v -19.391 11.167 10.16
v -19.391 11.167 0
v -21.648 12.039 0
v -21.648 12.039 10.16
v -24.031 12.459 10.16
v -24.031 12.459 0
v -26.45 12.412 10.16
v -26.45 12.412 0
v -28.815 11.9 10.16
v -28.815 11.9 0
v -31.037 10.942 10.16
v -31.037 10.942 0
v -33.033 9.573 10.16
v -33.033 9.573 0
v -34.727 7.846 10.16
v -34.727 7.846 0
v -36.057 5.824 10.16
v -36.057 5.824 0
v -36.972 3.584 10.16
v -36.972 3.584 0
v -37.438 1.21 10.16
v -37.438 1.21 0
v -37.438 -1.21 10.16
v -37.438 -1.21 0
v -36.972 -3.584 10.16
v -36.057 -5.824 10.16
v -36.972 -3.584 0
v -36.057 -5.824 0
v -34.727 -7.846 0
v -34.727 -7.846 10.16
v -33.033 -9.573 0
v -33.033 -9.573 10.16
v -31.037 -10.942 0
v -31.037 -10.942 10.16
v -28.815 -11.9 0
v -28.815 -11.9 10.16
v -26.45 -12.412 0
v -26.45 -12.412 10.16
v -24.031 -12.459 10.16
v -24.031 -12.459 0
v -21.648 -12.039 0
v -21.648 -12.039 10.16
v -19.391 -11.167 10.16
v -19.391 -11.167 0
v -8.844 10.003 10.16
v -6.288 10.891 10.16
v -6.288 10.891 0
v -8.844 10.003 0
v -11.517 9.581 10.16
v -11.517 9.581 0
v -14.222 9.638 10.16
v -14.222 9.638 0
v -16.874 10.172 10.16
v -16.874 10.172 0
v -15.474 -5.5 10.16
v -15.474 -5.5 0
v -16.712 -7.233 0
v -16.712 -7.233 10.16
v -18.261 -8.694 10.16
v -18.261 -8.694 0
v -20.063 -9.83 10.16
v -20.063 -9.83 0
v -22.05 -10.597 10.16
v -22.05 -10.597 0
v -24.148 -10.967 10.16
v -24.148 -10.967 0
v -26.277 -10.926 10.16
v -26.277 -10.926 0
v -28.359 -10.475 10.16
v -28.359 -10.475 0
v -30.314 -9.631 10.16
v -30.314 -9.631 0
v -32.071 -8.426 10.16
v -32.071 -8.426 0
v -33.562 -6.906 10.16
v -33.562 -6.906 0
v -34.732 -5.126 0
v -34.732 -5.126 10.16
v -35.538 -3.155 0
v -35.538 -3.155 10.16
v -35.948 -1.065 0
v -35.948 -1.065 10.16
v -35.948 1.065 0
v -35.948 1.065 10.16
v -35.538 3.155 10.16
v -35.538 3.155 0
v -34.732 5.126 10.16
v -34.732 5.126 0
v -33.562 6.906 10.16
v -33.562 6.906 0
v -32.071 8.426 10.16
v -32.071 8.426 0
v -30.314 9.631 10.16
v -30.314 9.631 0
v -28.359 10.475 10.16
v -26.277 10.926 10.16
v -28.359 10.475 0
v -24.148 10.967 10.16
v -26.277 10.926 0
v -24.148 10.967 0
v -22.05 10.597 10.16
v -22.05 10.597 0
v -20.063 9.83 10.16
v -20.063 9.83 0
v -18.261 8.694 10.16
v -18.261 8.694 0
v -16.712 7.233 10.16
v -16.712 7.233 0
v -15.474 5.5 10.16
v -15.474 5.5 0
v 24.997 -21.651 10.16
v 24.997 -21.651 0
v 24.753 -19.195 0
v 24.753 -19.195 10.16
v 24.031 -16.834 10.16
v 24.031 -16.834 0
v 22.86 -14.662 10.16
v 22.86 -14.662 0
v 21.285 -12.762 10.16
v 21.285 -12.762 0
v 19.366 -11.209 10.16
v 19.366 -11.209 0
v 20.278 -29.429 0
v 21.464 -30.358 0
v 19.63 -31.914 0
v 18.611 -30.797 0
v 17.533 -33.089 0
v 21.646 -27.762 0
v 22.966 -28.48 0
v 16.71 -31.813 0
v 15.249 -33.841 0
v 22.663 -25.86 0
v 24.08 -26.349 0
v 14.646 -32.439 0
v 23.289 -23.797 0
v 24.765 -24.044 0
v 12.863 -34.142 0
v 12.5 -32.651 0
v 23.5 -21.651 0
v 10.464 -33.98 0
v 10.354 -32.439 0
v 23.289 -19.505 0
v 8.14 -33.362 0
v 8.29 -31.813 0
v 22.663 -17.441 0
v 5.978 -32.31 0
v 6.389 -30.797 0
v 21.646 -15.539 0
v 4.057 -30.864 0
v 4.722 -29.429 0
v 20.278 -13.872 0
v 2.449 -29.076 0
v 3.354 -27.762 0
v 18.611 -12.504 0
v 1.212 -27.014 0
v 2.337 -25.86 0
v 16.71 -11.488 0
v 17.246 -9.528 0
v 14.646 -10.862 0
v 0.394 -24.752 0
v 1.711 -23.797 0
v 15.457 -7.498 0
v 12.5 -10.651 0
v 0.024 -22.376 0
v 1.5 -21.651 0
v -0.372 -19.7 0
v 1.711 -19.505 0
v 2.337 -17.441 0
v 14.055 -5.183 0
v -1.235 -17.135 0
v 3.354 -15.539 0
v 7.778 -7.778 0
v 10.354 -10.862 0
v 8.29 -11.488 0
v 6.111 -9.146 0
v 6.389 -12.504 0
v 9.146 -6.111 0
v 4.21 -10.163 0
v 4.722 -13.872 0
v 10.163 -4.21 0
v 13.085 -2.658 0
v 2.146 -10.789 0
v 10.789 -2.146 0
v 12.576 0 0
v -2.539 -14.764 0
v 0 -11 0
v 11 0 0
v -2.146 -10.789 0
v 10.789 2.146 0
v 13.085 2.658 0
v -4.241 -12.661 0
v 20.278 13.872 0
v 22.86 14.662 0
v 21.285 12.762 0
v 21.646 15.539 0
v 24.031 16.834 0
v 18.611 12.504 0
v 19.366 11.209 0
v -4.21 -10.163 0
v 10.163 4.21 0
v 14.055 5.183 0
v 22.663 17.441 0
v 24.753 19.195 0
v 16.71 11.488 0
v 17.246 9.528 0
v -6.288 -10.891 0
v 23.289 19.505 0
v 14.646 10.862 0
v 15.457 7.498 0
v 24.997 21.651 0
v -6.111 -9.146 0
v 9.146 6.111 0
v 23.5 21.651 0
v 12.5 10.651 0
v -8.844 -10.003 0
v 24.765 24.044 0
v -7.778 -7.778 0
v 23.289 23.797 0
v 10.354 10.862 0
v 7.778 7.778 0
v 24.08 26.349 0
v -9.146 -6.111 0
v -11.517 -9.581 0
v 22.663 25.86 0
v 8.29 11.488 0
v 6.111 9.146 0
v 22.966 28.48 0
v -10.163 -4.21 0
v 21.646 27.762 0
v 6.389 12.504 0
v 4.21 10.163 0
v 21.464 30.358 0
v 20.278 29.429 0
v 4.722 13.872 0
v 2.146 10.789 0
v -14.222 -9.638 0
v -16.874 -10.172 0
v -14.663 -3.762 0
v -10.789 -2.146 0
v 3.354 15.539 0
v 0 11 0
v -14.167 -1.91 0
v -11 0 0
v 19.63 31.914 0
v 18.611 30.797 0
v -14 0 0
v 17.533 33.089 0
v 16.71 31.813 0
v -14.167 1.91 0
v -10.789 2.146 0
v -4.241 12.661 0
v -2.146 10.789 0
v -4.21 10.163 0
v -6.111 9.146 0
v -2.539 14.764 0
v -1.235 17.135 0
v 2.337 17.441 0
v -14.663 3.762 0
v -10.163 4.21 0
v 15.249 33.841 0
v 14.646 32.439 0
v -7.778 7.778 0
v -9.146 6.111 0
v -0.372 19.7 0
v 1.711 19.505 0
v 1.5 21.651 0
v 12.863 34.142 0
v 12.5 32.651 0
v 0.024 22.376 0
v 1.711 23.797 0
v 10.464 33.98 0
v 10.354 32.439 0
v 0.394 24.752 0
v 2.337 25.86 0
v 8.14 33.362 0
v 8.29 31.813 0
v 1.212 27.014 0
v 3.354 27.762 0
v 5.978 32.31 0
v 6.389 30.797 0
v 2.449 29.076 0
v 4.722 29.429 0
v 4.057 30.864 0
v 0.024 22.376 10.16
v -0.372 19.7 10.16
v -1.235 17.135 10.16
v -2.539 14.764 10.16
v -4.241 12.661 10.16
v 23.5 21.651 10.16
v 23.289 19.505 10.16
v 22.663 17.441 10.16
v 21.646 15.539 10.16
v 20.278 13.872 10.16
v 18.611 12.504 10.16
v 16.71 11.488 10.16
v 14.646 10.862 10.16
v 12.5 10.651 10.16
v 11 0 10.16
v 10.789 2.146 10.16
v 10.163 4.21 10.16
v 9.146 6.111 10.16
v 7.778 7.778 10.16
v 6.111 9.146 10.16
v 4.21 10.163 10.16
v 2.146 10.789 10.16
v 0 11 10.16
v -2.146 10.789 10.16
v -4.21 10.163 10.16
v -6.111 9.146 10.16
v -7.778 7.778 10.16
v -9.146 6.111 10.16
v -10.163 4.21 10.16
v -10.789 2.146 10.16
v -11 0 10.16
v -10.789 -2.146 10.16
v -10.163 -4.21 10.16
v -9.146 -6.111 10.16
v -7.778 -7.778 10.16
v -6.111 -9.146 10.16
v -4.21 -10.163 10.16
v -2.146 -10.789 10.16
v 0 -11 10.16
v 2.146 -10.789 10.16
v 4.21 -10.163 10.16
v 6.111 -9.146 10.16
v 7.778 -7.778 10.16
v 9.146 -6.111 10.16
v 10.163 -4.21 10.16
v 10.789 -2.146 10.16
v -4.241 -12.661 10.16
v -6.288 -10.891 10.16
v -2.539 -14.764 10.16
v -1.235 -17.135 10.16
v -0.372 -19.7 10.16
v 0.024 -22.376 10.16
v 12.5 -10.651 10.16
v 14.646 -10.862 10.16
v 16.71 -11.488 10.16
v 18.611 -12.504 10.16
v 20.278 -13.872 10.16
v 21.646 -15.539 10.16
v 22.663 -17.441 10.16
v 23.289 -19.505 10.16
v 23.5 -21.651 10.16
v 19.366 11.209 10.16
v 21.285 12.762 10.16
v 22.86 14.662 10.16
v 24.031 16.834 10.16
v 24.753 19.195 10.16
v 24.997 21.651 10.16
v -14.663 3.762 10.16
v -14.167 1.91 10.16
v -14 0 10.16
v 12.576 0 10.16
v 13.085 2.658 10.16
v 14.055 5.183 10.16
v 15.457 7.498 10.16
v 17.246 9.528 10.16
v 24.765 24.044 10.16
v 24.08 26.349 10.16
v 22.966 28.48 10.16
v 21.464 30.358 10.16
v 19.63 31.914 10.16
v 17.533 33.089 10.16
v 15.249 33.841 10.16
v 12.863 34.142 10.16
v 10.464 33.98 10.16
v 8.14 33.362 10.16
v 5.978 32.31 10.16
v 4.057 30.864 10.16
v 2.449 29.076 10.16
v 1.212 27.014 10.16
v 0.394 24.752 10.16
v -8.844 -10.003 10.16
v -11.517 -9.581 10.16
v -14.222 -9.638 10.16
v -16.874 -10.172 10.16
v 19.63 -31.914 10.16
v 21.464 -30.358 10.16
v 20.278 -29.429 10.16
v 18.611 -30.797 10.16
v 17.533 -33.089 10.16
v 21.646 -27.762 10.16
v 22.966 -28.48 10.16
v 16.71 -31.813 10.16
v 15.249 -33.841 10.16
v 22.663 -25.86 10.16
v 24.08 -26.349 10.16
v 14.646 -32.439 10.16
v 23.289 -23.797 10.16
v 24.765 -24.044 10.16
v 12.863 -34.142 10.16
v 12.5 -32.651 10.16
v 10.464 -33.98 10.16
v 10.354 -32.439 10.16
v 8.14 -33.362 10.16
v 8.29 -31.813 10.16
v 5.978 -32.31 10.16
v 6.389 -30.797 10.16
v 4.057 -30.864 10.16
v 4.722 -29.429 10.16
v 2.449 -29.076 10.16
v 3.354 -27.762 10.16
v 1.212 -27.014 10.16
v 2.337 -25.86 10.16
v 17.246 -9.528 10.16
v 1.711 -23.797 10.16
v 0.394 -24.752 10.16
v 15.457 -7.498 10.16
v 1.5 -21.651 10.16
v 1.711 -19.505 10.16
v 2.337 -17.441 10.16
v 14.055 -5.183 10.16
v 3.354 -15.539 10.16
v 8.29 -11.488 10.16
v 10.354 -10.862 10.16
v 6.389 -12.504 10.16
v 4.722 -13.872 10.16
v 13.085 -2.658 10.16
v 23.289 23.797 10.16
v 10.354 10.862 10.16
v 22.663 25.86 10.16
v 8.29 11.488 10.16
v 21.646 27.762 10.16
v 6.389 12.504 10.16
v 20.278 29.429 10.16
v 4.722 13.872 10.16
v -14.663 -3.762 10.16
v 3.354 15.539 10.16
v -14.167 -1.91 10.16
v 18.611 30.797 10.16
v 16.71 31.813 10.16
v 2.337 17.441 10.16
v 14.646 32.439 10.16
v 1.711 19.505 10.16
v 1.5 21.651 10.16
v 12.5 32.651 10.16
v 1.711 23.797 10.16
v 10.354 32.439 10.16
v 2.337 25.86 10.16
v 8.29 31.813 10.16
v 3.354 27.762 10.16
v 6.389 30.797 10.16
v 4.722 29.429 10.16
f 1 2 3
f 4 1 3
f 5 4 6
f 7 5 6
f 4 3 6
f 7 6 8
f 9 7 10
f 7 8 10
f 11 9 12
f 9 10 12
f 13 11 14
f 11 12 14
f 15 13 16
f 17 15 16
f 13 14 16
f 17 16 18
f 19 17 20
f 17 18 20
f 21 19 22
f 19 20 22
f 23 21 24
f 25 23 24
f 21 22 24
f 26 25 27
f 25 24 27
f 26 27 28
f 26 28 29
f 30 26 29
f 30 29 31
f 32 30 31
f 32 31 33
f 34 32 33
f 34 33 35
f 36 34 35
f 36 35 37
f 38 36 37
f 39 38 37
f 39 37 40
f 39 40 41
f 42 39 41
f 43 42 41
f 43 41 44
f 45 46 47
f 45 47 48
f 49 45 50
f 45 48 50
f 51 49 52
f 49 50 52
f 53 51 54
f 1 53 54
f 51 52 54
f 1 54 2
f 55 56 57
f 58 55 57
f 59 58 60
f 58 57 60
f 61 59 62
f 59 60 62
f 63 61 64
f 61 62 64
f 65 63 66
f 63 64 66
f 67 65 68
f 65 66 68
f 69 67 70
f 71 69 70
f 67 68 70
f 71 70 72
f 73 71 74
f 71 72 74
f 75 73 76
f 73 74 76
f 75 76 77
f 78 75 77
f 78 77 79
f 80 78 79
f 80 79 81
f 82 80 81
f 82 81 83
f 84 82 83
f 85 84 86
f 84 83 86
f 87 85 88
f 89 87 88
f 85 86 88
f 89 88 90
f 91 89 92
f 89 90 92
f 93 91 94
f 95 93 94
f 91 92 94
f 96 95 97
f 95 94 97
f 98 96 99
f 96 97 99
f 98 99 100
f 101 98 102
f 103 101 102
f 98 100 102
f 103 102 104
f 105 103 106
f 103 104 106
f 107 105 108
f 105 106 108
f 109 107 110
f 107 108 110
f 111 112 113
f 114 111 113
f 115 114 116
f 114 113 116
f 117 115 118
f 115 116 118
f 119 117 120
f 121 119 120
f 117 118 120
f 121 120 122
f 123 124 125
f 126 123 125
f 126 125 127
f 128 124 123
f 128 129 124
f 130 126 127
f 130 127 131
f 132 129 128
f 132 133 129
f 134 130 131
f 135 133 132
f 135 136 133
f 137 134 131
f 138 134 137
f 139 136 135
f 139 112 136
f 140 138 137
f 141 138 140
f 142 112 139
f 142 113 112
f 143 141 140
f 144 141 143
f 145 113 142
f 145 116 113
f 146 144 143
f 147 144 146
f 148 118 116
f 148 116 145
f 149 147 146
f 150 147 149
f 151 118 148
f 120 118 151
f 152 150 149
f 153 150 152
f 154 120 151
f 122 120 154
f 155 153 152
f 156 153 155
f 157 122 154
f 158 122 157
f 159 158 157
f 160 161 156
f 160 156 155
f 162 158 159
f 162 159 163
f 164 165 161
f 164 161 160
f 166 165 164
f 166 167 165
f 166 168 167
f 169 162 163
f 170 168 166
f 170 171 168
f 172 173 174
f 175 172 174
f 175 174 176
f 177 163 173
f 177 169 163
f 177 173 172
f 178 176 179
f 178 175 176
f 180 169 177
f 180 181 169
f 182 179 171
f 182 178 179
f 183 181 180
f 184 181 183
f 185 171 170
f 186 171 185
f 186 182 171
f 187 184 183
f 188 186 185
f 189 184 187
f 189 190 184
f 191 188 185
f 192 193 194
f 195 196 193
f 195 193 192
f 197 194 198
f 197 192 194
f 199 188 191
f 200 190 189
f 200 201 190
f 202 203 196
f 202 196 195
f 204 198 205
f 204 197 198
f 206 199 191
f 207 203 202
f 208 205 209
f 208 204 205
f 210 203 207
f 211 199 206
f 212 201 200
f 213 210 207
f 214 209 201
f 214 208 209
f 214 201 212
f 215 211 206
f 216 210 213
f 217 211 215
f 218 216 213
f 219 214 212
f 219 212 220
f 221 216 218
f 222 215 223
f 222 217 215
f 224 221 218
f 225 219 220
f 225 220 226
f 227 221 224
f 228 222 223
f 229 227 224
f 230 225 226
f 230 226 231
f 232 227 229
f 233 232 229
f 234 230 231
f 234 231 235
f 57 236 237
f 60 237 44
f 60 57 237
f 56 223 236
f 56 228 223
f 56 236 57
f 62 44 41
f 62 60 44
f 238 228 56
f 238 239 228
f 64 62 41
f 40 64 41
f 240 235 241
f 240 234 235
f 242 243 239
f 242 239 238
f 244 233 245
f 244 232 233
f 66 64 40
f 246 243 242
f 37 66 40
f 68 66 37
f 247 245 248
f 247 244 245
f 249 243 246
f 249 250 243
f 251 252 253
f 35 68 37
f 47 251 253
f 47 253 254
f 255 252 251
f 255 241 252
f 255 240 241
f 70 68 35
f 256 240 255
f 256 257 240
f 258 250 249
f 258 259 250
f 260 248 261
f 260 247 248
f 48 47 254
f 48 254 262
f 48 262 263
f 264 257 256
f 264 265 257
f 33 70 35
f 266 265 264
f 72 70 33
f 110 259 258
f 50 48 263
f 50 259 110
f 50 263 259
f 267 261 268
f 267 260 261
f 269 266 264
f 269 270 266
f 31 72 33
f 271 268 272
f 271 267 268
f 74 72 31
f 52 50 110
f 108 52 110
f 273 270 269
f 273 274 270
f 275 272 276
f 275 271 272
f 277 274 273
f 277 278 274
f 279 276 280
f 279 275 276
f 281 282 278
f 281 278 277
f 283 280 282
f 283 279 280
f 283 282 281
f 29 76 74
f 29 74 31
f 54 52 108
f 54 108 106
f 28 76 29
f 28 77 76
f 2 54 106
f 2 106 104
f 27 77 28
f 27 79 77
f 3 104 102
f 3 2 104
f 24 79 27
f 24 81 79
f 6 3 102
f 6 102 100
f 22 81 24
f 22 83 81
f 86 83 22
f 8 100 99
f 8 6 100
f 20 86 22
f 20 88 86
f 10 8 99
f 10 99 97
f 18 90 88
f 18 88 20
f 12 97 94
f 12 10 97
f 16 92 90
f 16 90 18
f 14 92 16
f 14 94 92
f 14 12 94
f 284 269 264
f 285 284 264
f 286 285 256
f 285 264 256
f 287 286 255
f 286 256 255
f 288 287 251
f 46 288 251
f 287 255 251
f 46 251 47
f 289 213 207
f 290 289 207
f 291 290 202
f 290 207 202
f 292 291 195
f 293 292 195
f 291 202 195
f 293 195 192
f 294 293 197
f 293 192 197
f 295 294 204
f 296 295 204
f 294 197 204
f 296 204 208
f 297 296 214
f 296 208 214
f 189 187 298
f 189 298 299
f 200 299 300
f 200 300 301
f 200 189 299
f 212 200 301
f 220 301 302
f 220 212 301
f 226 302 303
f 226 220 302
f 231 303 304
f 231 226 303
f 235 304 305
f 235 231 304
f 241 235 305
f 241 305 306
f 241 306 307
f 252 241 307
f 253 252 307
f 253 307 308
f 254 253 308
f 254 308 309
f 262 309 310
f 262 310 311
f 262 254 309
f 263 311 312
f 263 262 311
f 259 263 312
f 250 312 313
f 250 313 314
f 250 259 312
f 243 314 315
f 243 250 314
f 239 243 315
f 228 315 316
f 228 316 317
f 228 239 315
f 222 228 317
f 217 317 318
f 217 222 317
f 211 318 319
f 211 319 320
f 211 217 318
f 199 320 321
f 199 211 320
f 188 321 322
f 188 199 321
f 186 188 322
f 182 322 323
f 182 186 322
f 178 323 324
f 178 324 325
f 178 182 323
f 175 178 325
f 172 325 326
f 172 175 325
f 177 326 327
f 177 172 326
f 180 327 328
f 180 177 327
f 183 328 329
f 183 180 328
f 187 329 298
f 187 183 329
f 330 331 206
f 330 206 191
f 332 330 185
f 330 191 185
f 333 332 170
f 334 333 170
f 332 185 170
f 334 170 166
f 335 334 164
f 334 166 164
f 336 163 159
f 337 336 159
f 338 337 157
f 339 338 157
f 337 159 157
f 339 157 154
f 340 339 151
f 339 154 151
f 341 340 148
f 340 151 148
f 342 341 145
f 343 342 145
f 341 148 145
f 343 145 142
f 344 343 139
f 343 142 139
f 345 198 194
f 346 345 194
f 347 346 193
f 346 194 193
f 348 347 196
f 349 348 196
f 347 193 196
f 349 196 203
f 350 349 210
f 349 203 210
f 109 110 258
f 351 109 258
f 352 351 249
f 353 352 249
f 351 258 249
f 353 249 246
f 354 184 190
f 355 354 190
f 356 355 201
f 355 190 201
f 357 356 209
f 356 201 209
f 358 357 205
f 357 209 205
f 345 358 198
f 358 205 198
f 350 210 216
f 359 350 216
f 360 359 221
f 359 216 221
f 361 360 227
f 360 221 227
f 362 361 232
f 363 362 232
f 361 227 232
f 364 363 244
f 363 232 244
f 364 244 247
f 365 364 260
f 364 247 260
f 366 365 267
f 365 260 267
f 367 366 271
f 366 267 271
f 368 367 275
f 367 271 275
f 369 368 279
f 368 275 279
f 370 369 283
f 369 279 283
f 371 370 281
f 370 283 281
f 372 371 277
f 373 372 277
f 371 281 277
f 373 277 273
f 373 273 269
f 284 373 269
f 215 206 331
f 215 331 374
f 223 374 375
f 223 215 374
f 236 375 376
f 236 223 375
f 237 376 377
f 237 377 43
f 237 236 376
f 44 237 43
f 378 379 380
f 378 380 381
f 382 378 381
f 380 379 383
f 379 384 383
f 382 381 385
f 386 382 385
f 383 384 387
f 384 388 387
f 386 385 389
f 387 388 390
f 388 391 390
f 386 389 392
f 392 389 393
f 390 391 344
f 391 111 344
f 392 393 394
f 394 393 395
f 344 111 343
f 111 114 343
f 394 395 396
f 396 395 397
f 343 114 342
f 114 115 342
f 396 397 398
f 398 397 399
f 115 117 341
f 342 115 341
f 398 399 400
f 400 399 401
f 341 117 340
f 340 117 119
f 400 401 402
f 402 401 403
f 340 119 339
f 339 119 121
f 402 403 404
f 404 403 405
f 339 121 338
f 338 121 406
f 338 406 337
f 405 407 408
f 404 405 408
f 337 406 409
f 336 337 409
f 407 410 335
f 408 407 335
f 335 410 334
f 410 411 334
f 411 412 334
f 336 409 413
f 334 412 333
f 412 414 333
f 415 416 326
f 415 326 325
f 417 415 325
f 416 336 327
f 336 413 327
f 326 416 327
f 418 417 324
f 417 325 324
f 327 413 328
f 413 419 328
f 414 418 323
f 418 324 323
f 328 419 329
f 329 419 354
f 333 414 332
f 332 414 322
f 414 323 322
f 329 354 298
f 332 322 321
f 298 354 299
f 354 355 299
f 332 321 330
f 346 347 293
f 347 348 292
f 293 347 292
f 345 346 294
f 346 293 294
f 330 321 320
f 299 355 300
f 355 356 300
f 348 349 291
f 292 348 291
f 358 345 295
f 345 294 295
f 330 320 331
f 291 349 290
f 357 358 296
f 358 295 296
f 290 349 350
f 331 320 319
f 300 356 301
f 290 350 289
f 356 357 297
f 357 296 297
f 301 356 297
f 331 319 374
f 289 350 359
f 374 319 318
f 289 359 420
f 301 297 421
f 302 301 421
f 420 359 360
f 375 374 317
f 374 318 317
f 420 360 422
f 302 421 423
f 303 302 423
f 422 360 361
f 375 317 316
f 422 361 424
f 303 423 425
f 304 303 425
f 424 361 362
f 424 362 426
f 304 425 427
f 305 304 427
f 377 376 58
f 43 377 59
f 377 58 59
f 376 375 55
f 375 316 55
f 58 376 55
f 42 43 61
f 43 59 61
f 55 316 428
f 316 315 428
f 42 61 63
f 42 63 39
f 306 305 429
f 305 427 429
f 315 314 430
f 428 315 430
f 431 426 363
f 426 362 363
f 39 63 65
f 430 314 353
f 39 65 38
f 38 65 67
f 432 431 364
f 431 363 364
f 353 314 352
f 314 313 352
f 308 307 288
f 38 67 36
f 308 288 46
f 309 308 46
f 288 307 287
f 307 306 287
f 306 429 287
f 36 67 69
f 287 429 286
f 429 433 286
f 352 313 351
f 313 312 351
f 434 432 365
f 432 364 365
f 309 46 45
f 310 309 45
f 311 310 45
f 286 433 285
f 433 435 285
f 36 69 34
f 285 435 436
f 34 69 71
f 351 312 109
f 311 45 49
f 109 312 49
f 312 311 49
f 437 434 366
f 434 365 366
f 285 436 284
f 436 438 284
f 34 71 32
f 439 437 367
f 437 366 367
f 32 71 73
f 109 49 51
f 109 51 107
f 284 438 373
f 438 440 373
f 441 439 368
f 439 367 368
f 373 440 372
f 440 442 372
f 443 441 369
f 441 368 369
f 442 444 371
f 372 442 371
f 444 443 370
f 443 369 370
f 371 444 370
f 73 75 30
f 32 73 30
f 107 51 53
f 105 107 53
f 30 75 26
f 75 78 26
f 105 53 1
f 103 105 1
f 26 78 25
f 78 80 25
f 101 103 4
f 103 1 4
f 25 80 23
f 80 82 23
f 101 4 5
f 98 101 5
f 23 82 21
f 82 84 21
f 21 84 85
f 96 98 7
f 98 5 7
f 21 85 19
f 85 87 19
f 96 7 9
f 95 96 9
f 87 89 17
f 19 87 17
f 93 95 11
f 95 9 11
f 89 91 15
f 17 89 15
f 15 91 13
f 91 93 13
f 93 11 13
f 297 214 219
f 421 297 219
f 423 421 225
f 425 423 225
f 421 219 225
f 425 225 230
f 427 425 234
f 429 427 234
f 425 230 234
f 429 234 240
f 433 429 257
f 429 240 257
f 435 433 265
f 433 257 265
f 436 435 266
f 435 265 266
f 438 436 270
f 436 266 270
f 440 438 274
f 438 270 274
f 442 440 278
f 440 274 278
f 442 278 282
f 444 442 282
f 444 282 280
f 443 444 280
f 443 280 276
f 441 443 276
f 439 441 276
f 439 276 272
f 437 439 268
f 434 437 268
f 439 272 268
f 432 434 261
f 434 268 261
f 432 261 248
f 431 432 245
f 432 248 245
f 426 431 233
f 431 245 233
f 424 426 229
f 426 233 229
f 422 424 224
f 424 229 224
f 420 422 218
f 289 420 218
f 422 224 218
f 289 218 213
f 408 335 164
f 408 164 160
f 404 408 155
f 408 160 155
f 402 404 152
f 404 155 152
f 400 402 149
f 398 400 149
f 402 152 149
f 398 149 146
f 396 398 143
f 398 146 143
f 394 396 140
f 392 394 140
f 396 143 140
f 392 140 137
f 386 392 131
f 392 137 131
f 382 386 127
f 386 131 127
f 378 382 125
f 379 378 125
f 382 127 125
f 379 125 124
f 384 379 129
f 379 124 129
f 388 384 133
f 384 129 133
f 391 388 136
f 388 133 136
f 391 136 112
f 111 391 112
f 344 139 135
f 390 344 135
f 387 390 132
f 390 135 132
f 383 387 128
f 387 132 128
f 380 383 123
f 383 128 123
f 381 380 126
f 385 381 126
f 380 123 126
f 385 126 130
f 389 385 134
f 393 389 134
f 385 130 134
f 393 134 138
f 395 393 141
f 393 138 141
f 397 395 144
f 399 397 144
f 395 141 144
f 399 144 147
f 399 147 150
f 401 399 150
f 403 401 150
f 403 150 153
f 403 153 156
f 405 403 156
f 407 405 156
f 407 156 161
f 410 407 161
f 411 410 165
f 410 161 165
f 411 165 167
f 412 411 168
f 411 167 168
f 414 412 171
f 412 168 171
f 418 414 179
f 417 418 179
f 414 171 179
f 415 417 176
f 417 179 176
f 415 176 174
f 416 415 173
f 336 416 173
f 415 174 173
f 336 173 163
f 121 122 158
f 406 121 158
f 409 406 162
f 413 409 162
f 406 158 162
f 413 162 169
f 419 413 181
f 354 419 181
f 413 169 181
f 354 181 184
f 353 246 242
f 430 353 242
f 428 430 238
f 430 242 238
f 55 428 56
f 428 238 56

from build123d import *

# Parameters (mm, degrees)
F0_R        = 11
F1_DEPTH    = 10.16
F2_T1_DEPTH = 10.16


# Not quite as in the source:
# - a fillet or chamfer that OpenCascade refuses, or shapes differently, is made with other operations: its cross-section is extruded or revolved along the edge and cut away or added


with BuildPart() as f1:
    # F0 (on Top) → F1 (new body)
    with BuildSketch(Plane.XY):
        with BuildLine():
            ThreePointArc((-6.2500001721, -10.8253174479), (-12.5, 3.1e-08), (-6.2500001185, 10.8253174789))
            Line((-6.2500001185, 10.8253174789), (-14.177453734, 6.2484))
            ThreePointArc((-14.177453734, 6.2484), (-12.929018134, 3.2344098428), (-12.5032, 0))
            ThreePointArc((-12.5032, 0), (-12.929018134, -3.2344098428), (-14.177453734, -6.2484))
            Line((-14.177453734, -6.2484), (-6.2500001721, -10.8253174479))
        make_face()
        with BuildLine():
            Line((-15.4737205584, 5.5), (-14.177453734, 6.2484))
            ThreePointArc((-14.177453734, 6.2484), (-37.4968, 0), (-14.177453734, -6.2484))
            Line((-14.177453734, -6.2484), (-15.4737205584, -5.5))
            ThreePointArc((-15.4737205584, -5.5), (-36, 0), (-15.4737205584, 5.5))
        make_face()
        with BuildLine():
            Line((12.5, -9.1538350946), (12.5, 0))
            ThreePointArc((12.5, 0), (6.2499999139, -10.825317597), (-6.2500001721, -10.8253174479))
            Line((-6.2500001721, -10.8253174479), (1.677453734, -15.4022350946))
            ThreePointArc((1.677453734, -15.4022350946), (6.2516, -10.8280888286), (12.5, -9.1538350946))
        make_face()
        with BuildLine():
            ThreePointArc((24.9968, -21.6506350946), (21.3365720231, -12.8140630715), (12.5, -9.1538350946))
            Line((12.5, -9.1538350946), (12.5, -10.6506350946))
            ThreePointArc((12.5, -10.6506350946), (20.2781745931, -13.8724605016), (23.5, -21.6506350946))
            ThreePointArc((23.5, -21.6506350946), (9.6529905039, -32.2758191838), (2.9737205584, -16.1506350946))
            Line((2.9737205584, -16.1506350946), (1.677453734, -15.4022350946))
            ThreePointArc((1.677453734, -15.4022350946), (9.2655901572, -33.7216169606), (24.9968, -21.6506350946))
        make_face()
        with BuildLine():
            Line((12.5, -10.6506350946), (12.5, -9.1538350946))
            ThreePointArc((12.5, -9.1538350946), (6.2516, -10.8280888286), (1.677453734, -15.4022350946))
            Line((1.677453734, -15.4022350946), (2.9737205584, -16.1506350946))
            ThreePointArc((2.9737205584, -16.1506350946), (7, -12.124355653), (12.5, -10.6506350946))
        make_face()
        with BuildLine():
            ThreePointArc((-6.2500001721, -10.8253174479), (6.2499999139, -10.825317597), (12.5, 0))
            ThreePointArc((12.5, 0), (6.2499999408, 10.8253175815), (-6.2500001185, 10.8253174789))
            ThreePointArc((-6.2500001185, 10.8253174789), (-12.5, 3.1e-08), (-6.2500001721, -10.8253174479))
        make_face()
        Circle(F0_R, mode=Mode.SUBTRACT)
        with BuildLine():
            ThreePointArc((-6.2500001185, 10.8253174789), (6.2499999408, 10.8253175815), (12.5, 0))
            Line((12.5, 0), (12.5, 9.1538350946))
            ThreePointArc((12.5, 9.1538350946), (6.2516, 10.8280888286), (1.677453734, 15.4022350946))
            Line((1.677453734, 15.4022350946), (-6.2500001185, 10.8253174789))
        make_face()
        with BuildLine():
            ThreePointArc((1.677453734, 15.4022350946), (6.2516, 10.8280888286), (12.5, 9.1538350946))
            Line((12.5, 9.1538350946), (12.5, 10.6506350946))
            ThreePointArc((12.5, 10.6506350946), (7, 12.124355653), (2.9737205584, 16.1506350946))
            Line((2.9737205584, 16.1506350946), (1.677453734, 15.4022350946))
        make_face()
        with BuildLine():
            Line((12.5, 10.6506350946), (12.5, 9.1538350946))
            ThreePointArc((12.5, 9.1538350946), (21.3365720231, 12.8140630715), (24.9968, 21.6506350946))
            ThreePointArc((24.9968, 21.6506350946), (9.2655901572, 33.7216169606), (1.677453734, 15.4022350946))
            Line((1.677453734, 15.4022350946), (2.9737205584, 16.1506350946))
            ThreePointArc((2.9737205584, 16.1506350946), (9.6529905039, 32.2758191838), (23.5, 21.6506350946))
            ThreePointArc((23.5, 21.6506350946), (20.2781745931, 13.8724605016), (12.5, 10.6506350946))
        make_face()
        with BuildLine():
            ThreePointArc((-12.5032, 0), (-12.929018134, 3.2344098428), (-14.177453734, 6.2484))
            Line((-14.177453734, 6.2484), (-15.4737205584, 5.5))
            ThreePointArc((-15.4737205584, 5.5), (-14.3748159108, 2.8470094961), (-14, 0))
            ThreePointArc((-14, 0), (-14.3748159108, -2.8470094961), (-15.4737205584, -5.5))
            Line((-15.4737205584, -5.5), (-14.177453734, -6.2484))
            ThreePointArc((-14.177453734, -6.2484), (-12.929018134, -3.2344098428), (-12.5032, 0))
        make_face()
    extrude(amount=F1_DEPTH)

    # F2: fillet of radius 15.24 on 6 edges, made by hand

    # F2_s2 → F2_t1 (join)
    with BuildSketch(Plane.XY):
        with BuildLine():
            ThreePointArc((-4.9300135605, -11.5874120735), (-12.1072951031, -9.5520710185), (-19.3906654504, -11.1671561353))
            ThreePointArc((-19.3906654504, -11.1671561353), (-16.42385767, -9.0895430565), (-14.177453734, -6.2484))
            Line((-14.177453734, -6.2484), (-4.9300135605, -11.5874120735))
        make_face()
        with BuildLine():
            ThreePointArc((12.5, -1.5241890523), (14.3259837123, 5.7091896211), (19.3663736264, 11.2092308086))
            ThreePointArc((19.3663736264, 11.2092308086), (16.0837040307, 9.6787064421), (12.5, 9.1538350946))
            Line((12.5, 9.1538350946), (12.5, -1.5241890523))
        make_face()
        with BuildLine():
            ThreePointArc((19.3663736264, -11.2092308086), (14.3259837123, -5.7091896211), (12.5, 1.5241890523))
            Line((12.5, 1.5241890523), (12.5, -9.1538350946))
            ThreePointArc((12.5, -9.1538350946), (16.0837040307, -9.6787064421), (19.3663736264, -11.2092308086))
        make_face()
        with BuildLine():
            ThreePointArc((0.024291824, 22.3763869439), (-2.2186886092, 15.2612606396), (-7.5699864395, 10.0632230212))
            Line((-7.5699864395, 10.0632230212), (1.677453734, 15.4022350946))
            ThreePointArc((1.677453734, 15.4022350946), (0.3401536393, 18.7682494986), (0.024291824, 22.3763869439))
        make_face()
        with BuildLine():
            ThreePointArc((-4.9300135605, 11.5874120735), (-12.1072951031, 9.5520710185), (-19.3906654504, 11.1671561353))
            ThreePointArc((-19.3906654504, 11.1671561353), (-16.42385767, 9.0895430565), (-14.177453734, 6.2484))
            Line((-14.177453734, 6.2484), (-4.9300135605, 11.5874120735))
        make_face()
        with BuildLine():
            ThreePointArc((-7.5699864395, -10.0632230212), (-2.2186886092, -15.2612606396), (0.024291824, -22.3763869439))
            ThreePointArc((0.024291824, -22.3763869439), (0.3401536393, -18.7682494986), (1.677453734, -15.4022350946))
            Line((1.677453734, -15.4022350946), (-7.5699864395, -10.0632230212))
        make_face()
    extrude(amount=F2_T1_DEPTH)


solid = f1.part
